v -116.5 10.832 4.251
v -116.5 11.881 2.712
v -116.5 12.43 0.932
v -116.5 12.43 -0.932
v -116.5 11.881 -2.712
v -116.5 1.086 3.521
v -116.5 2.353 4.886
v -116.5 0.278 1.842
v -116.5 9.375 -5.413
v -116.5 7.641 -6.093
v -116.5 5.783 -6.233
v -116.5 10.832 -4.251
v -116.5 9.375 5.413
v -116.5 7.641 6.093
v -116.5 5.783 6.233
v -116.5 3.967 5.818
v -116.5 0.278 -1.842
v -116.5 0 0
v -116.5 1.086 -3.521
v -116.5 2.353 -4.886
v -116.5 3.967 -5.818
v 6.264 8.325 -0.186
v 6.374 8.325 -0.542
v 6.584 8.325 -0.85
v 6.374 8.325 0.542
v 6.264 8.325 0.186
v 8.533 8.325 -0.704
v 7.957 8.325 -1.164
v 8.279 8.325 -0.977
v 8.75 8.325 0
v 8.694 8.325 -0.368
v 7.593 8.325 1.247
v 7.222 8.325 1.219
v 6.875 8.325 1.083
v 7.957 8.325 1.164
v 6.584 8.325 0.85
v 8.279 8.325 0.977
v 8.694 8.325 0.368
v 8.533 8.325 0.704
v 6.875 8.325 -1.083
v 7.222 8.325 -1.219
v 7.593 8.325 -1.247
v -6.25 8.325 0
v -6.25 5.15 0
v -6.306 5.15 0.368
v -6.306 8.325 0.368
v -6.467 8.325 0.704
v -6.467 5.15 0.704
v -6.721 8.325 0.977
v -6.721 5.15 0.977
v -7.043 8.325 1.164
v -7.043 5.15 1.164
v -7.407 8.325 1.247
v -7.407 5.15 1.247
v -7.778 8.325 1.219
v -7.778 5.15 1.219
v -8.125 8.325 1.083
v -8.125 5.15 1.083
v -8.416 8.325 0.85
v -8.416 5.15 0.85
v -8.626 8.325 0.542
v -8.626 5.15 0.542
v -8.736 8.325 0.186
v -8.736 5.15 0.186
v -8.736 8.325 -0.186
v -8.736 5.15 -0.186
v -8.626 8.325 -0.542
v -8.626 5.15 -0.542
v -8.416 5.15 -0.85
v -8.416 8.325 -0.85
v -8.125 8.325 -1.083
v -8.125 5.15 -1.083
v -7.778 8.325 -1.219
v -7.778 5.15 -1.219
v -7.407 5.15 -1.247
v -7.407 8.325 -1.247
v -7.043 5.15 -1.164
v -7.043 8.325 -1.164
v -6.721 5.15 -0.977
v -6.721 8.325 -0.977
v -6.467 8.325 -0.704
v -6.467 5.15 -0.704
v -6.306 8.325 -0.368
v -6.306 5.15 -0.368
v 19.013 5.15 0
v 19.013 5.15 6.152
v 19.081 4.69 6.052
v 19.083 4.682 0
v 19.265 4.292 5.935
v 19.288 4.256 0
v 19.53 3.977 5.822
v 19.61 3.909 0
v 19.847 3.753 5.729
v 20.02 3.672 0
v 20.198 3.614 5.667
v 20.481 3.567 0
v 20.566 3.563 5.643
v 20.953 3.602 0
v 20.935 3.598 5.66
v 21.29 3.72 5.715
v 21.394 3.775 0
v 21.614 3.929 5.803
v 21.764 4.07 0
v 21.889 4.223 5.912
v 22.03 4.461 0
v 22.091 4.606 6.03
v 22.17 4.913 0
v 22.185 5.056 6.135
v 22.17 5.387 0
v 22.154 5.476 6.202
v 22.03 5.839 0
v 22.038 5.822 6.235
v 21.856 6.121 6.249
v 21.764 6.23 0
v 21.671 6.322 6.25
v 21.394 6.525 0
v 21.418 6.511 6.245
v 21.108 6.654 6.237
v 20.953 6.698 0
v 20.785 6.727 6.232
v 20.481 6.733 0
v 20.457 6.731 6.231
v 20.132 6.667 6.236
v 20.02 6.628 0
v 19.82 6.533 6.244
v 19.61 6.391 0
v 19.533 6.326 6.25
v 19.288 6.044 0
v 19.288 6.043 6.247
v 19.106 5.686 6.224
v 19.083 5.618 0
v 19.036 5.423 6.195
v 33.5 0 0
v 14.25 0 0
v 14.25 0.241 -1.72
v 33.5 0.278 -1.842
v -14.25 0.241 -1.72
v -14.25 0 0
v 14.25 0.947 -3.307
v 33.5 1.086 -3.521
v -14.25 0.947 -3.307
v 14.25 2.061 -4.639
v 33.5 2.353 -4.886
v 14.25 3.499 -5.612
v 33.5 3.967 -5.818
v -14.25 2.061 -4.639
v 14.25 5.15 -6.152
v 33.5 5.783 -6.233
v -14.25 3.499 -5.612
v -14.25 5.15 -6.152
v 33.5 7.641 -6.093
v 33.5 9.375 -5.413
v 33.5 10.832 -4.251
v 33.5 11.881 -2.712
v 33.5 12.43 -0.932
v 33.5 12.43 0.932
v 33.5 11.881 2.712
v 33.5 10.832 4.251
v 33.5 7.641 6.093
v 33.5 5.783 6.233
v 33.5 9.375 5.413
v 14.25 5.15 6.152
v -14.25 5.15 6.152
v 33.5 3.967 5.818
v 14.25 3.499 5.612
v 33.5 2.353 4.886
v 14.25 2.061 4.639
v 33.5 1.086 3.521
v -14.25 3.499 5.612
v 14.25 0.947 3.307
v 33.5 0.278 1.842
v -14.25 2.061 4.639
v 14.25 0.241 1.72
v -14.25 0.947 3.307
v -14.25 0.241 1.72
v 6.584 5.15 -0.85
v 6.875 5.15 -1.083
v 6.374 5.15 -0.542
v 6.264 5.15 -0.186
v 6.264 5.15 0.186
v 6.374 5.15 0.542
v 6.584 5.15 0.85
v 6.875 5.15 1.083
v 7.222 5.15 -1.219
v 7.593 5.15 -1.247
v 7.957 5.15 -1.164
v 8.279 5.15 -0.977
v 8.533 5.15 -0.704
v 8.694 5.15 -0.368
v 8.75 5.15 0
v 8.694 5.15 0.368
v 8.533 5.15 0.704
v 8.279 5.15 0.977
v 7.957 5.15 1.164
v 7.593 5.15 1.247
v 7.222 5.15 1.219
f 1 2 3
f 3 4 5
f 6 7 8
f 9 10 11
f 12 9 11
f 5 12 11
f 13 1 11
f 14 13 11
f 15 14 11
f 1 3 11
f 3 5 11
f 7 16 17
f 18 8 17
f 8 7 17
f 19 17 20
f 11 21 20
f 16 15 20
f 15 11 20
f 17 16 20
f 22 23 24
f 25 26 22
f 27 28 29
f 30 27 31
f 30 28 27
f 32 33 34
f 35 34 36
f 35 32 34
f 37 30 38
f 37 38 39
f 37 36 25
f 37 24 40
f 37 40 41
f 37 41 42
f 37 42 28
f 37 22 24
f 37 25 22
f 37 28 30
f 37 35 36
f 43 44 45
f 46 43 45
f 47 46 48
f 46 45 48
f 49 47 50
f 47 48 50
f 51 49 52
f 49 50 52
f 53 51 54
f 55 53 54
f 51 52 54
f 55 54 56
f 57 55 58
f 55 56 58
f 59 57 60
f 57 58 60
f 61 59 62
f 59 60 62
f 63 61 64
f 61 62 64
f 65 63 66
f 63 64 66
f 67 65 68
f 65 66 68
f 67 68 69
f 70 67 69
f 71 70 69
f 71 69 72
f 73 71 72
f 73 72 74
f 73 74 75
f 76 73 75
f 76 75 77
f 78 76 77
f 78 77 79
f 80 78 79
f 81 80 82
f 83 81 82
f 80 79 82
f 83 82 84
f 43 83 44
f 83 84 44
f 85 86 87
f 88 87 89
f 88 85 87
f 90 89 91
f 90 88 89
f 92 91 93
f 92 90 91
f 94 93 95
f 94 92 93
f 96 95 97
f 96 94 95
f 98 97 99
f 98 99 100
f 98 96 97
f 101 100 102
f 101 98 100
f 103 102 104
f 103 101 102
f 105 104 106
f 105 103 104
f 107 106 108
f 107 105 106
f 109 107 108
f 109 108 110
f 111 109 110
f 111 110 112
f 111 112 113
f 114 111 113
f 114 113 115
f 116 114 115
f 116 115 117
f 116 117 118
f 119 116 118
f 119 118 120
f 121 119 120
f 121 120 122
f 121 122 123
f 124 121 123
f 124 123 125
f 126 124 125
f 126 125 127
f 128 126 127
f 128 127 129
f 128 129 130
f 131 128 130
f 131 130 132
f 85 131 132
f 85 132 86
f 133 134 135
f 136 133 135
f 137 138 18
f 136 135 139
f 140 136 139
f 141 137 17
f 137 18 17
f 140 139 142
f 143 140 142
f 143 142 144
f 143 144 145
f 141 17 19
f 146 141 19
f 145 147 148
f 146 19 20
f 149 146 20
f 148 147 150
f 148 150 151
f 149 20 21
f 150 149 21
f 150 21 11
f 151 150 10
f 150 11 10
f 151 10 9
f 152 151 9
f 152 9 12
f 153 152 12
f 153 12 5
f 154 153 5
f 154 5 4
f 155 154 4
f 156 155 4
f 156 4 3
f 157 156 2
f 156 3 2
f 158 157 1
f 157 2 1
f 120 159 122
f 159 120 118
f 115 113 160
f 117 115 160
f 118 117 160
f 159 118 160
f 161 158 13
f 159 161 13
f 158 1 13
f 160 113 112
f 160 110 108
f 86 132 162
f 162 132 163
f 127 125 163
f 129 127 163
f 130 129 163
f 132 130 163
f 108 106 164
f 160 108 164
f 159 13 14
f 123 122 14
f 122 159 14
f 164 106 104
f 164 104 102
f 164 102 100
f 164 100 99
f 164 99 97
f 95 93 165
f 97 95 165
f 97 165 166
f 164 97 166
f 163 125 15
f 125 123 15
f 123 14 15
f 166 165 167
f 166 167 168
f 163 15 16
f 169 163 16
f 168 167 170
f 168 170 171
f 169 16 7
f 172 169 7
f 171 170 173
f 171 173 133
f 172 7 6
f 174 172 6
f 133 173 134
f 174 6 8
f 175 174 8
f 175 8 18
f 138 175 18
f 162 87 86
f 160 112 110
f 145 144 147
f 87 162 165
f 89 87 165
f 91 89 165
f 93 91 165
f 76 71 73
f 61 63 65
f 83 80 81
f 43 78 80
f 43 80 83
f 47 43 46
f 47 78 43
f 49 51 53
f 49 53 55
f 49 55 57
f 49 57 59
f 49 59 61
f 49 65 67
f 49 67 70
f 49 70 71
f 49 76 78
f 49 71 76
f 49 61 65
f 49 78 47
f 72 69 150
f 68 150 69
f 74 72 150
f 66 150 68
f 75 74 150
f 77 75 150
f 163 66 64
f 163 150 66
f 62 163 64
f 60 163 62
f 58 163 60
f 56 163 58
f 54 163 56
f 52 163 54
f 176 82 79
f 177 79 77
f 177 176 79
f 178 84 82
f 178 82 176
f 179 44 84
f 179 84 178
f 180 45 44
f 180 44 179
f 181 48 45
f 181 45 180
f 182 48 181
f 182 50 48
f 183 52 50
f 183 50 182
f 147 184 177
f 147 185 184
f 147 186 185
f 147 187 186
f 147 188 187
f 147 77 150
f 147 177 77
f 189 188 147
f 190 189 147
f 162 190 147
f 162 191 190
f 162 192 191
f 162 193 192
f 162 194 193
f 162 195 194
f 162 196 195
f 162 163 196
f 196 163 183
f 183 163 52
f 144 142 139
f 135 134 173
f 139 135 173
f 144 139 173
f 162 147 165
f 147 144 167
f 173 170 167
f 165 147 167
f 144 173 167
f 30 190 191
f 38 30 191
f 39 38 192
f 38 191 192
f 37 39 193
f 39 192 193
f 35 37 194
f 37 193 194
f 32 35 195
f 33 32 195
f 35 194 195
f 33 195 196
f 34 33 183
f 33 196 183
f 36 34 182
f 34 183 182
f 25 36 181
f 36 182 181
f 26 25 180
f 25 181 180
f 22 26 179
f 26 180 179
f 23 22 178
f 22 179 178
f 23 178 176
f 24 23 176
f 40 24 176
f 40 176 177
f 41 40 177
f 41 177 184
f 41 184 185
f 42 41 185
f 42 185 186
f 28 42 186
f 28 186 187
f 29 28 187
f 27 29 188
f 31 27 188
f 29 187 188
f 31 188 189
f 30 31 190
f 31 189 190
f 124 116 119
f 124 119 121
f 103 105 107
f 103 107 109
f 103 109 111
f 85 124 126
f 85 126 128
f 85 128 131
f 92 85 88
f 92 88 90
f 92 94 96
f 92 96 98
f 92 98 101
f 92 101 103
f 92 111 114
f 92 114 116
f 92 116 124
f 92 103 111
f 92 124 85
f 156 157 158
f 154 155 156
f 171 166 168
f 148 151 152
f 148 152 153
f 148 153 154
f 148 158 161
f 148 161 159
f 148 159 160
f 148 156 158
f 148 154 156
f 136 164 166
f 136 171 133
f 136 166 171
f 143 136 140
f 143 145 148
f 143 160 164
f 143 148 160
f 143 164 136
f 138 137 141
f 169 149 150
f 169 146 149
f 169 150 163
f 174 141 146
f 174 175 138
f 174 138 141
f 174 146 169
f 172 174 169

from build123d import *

# Parameters (mm, degrees)
SKETCH1_R                = 1
SKETCH1_R_2              = 0.5
BOSS_EXTRUDE1_DEPTH      = 1.5
SKETCH2_W                = 5.75
SKETCH2_H                = 4
CUT_EXTRUDE1_DEPTH       = 1
BOSS_EXTRUDE2_DEPTH      = 25
BOSS_EXTRUDE2_DEPTH_BACK = 125
BOSS_EXTRUDE2_START      = 8.5
SKETCH5_R                = 6.25
SKETCH6_W                = 28.5
SKETCH6_H                = 12.5
CUT_EXTRUDE2_DEPTH       = 25
SKETCH7_R                = 1.25
CUT_EXTRUDE3_DEPTH       = 3.175
CUT_EXTRUDE4_REACH       = 119.335
CUT_EXTRUDE4_END_RADIUS  = 6.25
SKETCH8_R                = 1.5875


with BuildPart() as part:
    # Sketch1 → Boss-Extrude1 (new, symmetric)
    with BuildSketch(Plane.XY):
        Polygon((-8.5, -19.85), (-8.5, 0), (8.5, 0), (8.5, -19.85), (14.25, -19.85), (14.25, 10), (-14.25, 10), (-14.25, -19.85), align=None)
        with Locations((-7.5, 5)):
            Circle(SKETCH1_R, mode=Mode.SUBTRACT)
        with Locations((7.5, 5)):
            Circle(SKETCH1_R, mode=Mode.SUBTRACT)
        with Locations((-11.375, -17.35)):
            Circle(SKETCH1_R_2, mode=Mode.SUBTRACT)
        with Locations((11.375, -17.35)):
            Circle(SKETCH1_R_2, mode=Mode.SUBTRACT)
    extrude(amount=BOSS_EXTRUDE1_DEPTH, both=True)

    # Sketch2 → Cut-Extrude1 (cut)
    with BuildSketch(Plane.XY.offset(1.5)):
        with Locations((-11.375, -17.85)):
            Rectangle(SKETCH2_W, SKETCH2_H)
        with Locations((11.375, -17.85)):
            Rectangle(SKETCH2_W, SKETCH2_H)
    extrude(amount=-CUT_EXTRUDE1_DEPTH, mode=Mode.SUBTRACT)

    # Sketch5 → Boss-Extrude2 (add, two sides: drawn at the far end of the back side and taken through both)
    with BuildSketch(Plane(origin=(0, 0, 0), x_dir=(0, 0, -1), z_dir=(1, 0, 0)).offset(BOSS_EXTRUDE2_START - BOSS_EXTRUDE2_DEPTH_BACK)):
        with Locations(Location((0, 6.25, 0), (0, 0, 270))):
            Circle(SKETCH5_R)
    extrude(amount=BOSS_EXTRUDE2_DEPTH + BOSS_EXTRUDE2_DEPTH_BACK)

    # Sketch6 → Cut-Extrude2 (cut)
    with BuildSketch(Plane.XZ.offset(19.85)):
        Rectangle(SKETCH6_W, SKETCH6_H)
    extrude(amount=-CUT_EXTRUDE2_DEPTH, mode=Mode.SUBTRACT)

    # Sketch7 → Cut-Extrude3 (cut)
    with BuildSketch(Plane(origin=(0, 5.15, 0), x_dir=(-1, 0, 0), z_dir=(0, -1, 0))):
        with Locations(Location((7.5, 0, 0), (0, 0, 180))):
            Circle(SKETCH7_R)
        with Locations(Location((-7.5, 0, 0), (0, 0, 180))):
            Circle(SKETCH7_R)
    extrude(amount=-CUT_EXTRUDE3_DEPTH, mode=Mode.SUBTRACT)

    # Cut-Extrude4: up to this cylinder (the profile starts inside it)
    cut_extrude4_end = Plane(origin=(20.6, 6.25, 0), z_dir=(-1, 0, 0)) * Cylinder(CUT_EXTRUDE4_END_RADIUS, 252.17, mode=Mode.PRIVATE)
    # Sketch8 → Cut-Extrude4 (cut, up to the surface)
    with BuildSketch(Plane.XY, mode=Mode.PRIVATE) as cut_extrude4_sk1:
        with Locations(Location((20.6, 5.15, 0), (0, 0, 180))):
            Circle(SKETCH8_R)
    cut_extrude4_tool1 = extrude(cut_extrude4_sk1.sketch, amount=CUT_EXTRUDE4_REACH, mode=Mode.PRIVATE) & cut_extrude4_end
    add(cut_extrude4_tool1.solids().sort_by_distance((20.6, 5.15, 0))[0], mode=Mode.SUBTRACT)


solid = part.part
